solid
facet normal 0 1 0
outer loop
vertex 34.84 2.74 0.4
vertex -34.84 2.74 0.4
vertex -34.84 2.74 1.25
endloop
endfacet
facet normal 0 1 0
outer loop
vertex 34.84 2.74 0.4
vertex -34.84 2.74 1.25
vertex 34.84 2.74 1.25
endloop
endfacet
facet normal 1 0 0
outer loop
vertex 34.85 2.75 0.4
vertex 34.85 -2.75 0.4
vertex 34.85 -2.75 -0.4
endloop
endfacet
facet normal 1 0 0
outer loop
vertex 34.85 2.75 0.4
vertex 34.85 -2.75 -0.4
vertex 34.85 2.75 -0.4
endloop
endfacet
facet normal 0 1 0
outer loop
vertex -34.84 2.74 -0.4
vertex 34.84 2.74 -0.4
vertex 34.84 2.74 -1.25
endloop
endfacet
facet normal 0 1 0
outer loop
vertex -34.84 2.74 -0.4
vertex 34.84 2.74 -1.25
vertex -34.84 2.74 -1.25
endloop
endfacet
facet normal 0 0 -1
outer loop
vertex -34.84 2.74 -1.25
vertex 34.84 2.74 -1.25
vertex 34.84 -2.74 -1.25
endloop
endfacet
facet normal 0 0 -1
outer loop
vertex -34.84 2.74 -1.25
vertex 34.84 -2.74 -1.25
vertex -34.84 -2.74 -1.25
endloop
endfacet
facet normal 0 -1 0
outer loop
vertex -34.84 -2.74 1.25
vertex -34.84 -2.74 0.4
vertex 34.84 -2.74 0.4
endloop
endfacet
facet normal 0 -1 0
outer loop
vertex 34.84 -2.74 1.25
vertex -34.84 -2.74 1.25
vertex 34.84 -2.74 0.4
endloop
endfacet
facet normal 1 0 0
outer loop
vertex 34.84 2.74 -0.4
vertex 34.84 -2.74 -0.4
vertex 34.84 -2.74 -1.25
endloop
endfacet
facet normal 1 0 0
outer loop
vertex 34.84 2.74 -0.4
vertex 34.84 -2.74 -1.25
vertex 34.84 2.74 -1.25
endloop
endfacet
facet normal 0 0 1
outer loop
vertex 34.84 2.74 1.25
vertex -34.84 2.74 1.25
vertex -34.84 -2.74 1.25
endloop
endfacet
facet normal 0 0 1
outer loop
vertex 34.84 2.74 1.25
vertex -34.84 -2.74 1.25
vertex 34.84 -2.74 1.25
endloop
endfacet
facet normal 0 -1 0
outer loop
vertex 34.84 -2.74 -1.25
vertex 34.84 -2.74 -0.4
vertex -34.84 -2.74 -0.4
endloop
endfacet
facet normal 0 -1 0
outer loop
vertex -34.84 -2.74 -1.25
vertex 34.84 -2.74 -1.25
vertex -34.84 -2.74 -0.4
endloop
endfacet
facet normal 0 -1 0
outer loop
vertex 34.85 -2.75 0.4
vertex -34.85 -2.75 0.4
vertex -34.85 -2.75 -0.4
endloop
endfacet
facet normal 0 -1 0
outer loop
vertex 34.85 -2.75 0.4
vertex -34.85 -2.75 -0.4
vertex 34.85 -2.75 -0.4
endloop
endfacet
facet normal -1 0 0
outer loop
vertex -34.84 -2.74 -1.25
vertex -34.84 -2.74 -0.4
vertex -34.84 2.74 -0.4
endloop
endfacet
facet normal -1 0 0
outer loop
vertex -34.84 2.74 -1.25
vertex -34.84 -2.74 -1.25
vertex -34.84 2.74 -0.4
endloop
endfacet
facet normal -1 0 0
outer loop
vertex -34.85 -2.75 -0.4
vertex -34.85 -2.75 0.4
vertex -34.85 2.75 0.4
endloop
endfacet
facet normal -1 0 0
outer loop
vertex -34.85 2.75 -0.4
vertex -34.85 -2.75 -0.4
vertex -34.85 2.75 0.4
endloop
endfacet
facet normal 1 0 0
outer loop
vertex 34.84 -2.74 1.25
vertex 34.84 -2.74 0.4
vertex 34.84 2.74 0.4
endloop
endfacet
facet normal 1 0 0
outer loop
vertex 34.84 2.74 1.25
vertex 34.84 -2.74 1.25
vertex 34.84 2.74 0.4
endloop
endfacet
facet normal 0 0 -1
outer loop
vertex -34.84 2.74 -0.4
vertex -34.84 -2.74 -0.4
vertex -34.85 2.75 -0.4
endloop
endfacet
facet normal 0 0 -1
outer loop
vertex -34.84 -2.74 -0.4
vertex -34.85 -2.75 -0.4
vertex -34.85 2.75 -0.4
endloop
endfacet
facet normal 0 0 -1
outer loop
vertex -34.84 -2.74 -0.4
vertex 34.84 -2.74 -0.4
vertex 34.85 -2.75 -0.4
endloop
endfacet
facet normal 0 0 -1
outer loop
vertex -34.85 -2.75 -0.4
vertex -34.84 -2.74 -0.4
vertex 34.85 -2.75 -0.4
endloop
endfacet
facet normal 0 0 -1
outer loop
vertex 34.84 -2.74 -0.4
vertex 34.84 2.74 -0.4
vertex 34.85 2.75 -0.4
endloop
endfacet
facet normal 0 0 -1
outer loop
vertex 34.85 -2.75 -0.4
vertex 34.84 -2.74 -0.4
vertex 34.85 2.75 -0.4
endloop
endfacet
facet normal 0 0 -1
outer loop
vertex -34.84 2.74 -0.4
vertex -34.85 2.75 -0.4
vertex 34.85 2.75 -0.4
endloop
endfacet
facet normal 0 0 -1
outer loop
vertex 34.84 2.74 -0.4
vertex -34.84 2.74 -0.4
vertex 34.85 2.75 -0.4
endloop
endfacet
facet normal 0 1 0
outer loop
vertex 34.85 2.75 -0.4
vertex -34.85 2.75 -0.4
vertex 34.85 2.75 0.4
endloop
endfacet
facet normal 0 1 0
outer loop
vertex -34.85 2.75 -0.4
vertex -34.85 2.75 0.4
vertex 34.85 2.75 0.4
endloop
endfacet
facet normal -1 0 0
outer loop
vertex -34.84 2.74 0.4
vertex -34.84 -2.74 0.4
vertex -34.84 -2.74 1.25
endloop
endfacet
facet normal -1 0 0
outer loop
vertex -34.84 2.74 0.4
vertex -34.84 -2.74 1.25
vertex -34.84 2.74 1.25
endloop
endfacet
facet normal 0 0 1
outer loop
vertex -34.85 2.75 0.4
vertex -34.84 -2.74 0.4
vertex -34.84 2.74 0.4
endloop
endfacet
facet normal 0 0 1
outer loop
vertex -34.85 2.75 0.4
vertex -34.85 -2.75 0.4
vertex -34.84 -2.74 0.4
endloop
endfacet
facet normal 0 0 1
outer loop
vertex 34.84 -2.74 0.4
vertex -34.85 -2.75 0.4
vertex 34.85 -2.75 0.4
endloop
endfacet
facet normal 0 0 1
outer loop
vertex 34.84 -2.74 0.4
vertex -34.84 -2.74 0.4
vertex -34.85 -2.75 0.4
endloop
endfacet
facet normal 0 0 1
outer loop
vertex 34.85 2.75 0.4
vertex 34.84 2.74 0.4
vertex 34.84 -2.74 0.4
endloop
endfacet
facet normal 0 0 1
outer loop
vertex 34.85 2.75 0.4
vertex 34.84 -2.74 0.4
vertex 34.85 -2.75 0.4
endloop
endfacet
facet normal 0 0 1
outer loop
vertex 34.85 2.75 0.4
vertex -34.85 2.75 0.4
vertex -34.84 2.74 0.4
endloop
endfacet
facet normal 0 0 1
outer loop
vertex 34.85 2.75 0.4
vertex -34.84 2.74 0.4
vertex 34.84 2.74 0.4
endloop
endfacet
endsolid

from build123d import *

# Parameters (mm, degrees)
SKETCH1_W           = 69.7
SKETCH1_H           = 5.5
BOSS_EXTRUDE1_DEPTH = 0.4
SKETCH2_W           = 69.68
SKETCH2_H           = 5.48
BOSS_EXTRUDE2_DEPTH = 0.85
SKETCH3_W           = 69.68
SKETCH3_H           = 5.48
BOSS_EXTRUDE3_DEPTH = 0.85


with BuildPart() as part:
    # Sketch1 → Boss-Extrude1 (new body, symmetric)
    with BuildSketch(Plane.XY):
        Rectangle(SKETCH1_W, SKETCH1_H)
    extrude(amount=BOSS_EXTRUDE1_DEPTH, both=True)

    # Sketch2 → Boss-Extrude2 (add)
    with BuildSketch(Plane.XY.offset(0.4)):
        Rectangle(SKETCH2_W, SKETCH2_H)
    extrude(amount=BOSS_EXTRUDE2_DEPTH)

    # Sketch3 → Boss-Extrude3 (add)
    with BuildSketch(Plane(origin=(0, 0, -0.4), x_dir=(-1, 0, 0), z_dir=(0, 0, -1))):
        Rectangle(SKETCH3_W, SKETCH3_H)
    extrude(amount=BOSS_EXTRUDE3_DEPTH)


solid = part.part
